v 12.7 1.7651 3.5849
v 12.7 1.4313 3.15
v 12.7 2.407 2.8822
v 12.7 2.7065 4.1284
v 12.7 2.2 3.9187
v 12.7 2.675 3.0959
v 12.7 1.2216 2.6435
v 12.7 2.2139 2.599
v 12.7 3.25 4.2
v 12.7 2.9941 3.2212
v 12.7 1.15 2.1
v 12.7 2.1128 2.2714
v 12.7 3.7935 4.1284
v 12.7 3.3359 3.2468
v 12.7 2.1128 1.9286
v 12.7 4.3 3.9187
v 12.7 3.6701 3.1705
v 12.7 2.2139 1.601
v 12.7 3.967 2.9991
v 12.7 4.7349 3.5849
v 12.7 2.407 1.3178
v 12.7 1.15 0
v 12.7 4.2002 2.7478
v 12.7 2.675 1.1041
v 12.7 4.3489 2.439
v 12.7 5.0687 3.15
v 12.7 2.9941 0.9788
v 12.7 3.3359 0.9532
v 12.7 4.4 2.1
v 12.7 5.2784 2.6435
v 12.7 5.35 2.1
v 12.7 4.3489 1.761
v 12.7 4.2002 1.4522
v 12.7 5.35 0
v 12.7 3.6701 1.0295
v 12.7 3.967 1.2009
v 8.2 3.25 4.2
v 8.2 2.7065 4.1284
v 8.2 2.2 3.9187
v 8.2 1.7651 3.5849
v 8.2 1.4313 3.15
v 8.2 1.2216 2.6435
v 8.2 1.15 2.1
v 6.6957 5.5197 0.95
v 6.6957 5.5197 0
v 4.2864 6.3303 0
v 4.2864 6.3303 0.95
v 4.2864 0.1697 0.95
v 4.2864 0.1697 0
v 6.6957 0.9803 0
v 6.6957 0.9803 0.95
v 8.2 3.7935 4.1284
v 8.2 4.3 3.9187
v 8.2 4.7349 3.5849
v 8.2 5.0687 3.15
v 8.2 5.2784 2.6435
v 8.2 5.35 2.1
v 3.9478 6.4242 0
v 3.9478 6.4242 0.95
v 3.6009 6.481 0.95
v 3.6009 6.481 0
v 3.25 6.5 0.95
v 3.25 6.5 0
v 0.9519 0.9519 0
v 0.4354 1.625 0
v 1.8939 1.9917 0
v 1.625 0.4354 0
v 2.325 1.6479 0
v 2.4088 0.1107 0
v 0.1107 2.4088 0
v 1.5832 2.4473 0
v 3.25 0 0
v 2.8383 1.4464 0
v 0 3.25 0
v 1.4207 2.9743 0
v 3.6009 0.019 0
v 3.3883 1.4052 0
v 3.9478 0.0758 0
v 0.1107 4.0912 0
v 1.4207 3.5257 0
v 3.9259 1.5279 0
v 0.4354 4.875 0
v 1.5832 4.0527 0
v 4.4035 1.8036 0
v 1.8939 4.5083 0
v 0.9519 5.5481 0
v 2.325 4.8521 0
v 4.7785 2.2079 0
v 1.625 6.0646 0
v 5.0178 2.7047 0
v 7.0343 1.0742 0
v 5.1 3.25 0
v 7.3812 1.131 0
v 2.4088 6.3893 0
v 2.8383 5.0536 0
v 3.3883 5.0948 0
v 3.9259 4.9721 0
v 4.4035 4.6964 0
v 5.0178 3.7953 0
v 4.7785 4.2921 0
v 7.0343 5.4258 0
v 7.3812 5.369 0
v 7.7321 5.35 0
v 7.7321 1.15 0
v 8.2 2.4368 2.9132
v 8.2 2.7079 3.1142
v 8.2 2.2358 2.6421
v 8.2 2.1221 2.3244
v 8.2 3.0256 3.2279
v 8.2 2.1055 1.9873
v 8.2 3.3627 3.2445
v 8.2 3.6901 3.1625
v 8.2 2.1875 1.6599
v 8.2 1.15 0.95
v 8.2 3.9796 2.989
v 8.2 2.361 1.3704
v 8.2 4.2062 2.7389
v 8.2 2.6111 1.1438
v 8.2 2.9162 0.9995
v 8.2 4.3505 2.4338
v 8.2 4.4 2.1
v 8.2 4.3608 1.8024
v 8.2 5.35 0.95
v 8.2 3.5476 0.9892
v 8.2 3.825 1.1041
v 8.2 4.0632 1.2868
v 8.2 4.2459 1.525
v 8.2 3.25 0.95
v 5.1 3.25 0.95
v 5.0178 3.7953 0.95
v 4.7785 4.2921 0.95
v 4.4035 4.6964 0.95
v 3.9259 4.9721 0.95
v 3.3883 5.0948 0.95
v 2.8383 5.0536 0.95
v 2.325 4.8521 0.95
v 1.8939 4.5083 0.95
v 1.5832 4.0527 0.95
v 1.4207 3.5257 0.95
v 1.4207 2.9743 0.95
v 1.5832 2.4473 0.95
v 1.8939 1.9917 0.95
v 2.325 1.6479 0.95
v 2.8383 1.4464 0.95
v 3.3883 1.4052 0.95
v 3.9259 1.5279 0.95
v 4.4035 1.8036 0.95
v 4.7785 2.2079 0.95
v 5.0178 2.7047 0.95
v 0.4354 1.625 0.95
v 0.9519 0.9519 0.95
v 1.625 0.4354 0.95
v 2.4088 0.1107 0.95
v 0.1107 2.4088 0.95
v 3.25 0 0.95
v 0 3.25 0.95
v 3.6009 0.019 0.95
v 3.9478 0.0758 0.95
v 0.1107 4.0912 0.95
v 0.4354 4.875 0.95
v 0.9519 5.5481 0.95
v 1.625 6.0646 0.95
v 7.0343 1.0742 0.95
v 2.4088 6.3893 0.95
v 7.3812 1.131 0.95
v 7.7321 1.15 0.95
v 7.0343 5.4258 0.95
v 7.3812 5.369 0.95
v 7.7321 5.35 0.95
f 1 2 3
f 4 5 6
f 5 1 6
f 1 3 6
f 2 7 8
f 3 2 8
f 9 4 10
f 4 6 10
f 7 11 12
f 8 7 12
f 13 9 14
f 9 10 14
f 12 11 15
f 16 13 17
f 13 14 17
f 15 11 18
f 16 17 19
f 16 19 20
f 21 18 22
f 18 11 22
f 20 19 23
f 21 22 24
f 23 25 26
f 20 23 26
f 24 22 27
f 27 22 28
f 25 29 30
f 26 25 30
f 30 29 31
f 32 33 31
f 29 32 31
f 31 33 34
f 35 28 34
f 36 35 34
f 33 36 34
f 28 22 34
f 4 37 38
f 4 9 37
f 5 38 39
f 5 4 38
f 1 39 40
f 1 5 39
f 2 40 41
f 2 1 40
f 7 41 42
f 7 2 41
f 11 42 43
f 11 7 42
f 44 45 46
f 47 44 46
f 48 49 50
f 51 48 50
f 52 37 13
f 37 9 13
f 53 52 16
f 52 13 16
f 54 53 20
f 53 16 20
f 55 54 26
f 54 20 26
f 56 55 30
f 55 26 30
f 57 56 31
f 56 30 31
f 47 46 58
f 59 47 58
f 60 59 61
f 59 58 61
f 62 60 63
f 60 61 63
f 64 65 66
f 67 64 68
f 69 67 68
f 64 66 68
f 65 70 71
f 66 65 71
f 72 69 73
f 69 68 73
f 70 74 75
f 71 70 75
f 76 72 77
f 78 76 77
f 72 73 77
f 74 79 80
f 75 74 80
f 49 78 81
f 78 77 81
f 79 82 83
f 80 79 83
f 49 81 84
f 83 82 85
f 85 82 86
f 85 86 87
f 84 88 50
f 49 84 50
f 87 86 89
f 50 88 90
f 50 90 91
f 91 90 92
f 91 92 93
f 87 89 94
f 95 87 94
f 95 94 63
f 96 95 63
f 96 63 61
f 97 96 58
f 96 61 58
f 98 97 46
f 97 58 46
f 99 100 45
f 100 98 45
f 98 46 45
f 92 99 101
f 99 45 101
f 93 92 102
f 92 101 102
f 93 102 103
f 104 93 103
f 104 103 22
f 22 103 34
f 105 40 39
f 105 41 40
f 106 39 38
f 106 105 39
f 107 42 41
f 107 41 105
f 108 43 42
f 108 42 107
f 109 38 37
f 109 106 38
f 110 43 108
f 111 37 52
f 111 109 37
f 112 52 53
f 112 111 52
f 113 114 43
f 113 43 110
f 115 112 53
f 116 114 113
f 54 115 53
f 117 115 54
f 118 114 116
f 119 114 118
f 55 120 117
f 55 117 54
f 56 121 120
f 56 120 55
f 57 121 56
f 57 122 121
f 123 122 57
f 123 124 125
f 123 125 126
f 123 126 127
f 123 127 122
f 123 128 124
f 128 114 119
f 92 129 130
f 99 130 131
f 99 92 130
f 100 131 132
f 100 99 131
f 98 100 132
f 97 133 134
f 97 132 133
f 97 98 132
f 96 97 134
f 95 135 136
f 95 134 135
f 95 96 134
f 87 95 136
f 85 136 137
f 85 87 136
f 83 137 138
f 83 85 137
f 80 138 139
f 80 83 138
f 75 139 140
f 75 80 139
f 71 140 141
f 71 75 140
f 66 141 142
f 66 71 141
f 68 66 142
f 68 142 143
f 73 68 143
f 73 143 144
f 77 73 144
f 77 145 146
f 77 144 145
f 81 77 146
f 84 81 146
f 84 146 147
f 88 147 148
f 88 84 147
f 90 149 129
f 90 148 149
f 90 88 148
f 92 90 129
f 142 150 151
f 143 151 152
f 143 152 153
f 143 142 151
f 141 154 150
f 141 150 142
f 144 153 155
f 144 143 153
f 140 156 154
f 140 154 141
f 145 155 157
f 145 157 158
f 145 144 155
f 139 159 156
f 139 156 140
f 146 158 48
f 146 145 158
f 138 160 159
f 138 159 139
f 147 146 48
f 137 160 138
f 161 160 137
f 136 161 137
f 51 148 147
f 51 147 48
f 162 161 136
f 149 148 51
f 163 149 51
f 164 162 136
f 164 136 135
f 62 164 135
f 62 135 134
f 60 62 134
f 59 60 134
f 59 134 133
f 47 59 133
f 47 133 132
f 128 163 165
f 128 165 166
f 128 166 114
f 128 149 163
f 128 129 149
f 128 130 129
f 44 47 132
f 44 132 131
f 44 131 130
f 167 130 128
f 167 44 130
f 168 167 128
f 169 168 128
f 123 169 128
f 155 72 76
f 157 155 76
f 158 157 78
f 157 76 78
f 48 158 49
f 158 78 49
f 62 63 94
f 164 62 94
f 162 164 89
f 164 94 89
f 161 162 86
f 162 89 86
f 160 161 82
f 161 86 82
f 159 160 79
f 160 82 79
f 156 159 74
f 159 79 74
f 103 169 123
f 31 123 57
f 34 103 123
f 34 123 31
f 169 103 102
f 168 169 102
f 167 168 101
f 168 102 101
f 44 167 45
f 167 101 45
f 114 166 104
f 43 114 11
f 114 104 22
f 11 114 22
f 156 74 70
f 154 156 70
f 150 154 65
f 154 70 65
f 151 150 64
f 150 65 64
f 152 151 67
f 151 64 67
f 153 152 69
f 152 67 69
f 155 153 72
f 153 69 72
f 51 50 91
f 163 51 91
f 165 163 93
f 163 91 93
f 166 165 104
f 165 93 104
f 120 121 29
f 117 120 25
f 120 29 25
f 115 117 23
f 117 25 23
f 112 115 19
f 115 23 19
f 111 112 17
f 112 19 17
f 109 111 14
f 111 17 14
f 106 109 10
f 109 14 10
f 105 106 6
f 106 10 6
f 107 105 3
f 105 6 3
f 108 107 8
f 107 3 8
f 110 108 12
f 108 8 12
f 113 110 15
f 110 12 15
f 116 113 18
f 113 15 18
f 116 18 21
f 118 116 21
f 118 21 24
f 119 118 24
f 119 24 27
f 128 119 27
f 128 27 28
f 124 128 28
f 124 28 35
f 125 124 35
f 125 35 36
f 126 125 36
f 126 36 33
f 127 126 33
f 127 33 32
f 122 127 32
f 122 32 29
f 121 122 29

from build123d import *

# Parameters (mm, degrees)
F0_R     = 1.85
F1_DEPTH = 0.95
F2_W     = 4.5
F2_H     = 4.2
F3_DEPTH = 3.25
F4_R     = 2.09999
F5_R     = 1.15
F6_DEPTH = 25


# Not quite as in the source:
# - a fillet or chamfer is up to 0.001 mm smaller than in the source, because OpenCascade refuses the exact size


with BuildPart() as f1:
    # F0 (on Top) → F1 (new body)
    with BuildSketch(Plane.XY):
        with BuildLine():
            Line((8.2, 1.15), (12.7, 1.15))
            Line((12.7, 1.15), (12.7, 5.35))
            Line((12.7, 5.35), (8.2, 5.35))
            Line((8.2, 5.35), (7.7320977576, 5.35))
            ThreePointArc((7.7320977576, 5.35), (7.2069912058, 5.3927015871), (6.6956833513, 5.5196842405))
            Line((6.6956833513, 5.5196842405), (4.2864144063, 6.3303157595))
            ThreePointArc((4.2864144063, 6.3303157595), (3.7751065518, 6.4572984129), (3.25, 6.5))
            ThreePointArc((3.25, 6.5), (0.9519029611, 5.5480970389), (0, 3.25))
            ThreePointArc((0, 3.25), (0.9519029611, 0.9519029611), (3.25, 0))
            ThreePointArc((3.25, 0), (3.7751065518, 0.0427015871), (4.2864144063, 0.1696842405))
            Line((4.2864144063, 0.1696842405), (6.6956833513, 0.9803157595))
            ThreePointArc((6.6956833513, 0.9803157595), (7.2069912058, 1.1072984129), (7.7320977576, 1.15))
            Line((7.7320977576, 1.15), (8.2, 1.15))
        make_face()
        with Locations((3.25, 3.25)):
            Circle(F0_R, mode=Mode.SUBTRACT)
    extrude(amount=F1_DEPTH)

    # F2 (on face) → F3 (join)
    with BuildSketch(Plane.XY.offset(0.95)):
        with Locations((10.45, 3.25)):
            Rectangle(F2_W, F2_H)
    extrude(amount=F3_DEPTH)

    # F4 (radius 2.1 in the source; OpenCascade refuses exactly that, so slightly less here)
    f4_edges = [f1.edges().sort_by_distance(p)[0] for p in [
        (10.45, 5.35, 4.2),
        (10.45, 1.15, 4.2),
    ]]
    fillet(f4_edges, radius=F4_R)

    # F5 (on face) → F6 (cut)
    with BuildSketch(Plane.YZ.offset(12.7)):
        with Locations((3.25, 2.1)):
            Circle(F5_R)
    extrude(amount=-F6_DEPTH, mode=Mode.SUBTRACT)


solid = f1.part
